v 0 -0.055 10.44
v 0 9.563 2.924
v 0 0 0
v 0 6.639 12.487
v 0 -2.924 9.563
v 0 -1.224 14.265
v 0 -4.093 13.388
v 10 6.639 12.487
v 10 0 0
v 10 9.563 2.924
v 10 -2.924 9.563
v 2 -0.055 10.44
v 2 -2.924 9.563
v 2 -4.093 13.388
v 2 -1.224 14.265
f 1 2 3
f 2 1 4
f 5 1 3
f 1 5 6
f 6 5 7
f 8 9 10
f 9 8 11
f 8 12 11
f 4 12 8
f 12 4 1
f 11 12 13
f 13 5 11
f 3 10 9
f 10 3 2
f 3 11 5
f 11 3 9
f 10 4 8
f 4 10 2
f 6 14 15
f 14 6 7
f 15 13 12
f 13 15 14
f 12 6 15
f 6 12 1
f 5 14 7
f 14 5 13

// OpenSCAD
size = 10 ; rotation = 17 ; eps = 0.01 ; union () { rotate ([ rotation , 0 , 0 ]) cube ( size ); rotate ([ rotation , 0 , 0 ]) translate ([ 0 , 0 , size - eps ]) cube ([ 2 , 3 , 4 + eps ]); }
